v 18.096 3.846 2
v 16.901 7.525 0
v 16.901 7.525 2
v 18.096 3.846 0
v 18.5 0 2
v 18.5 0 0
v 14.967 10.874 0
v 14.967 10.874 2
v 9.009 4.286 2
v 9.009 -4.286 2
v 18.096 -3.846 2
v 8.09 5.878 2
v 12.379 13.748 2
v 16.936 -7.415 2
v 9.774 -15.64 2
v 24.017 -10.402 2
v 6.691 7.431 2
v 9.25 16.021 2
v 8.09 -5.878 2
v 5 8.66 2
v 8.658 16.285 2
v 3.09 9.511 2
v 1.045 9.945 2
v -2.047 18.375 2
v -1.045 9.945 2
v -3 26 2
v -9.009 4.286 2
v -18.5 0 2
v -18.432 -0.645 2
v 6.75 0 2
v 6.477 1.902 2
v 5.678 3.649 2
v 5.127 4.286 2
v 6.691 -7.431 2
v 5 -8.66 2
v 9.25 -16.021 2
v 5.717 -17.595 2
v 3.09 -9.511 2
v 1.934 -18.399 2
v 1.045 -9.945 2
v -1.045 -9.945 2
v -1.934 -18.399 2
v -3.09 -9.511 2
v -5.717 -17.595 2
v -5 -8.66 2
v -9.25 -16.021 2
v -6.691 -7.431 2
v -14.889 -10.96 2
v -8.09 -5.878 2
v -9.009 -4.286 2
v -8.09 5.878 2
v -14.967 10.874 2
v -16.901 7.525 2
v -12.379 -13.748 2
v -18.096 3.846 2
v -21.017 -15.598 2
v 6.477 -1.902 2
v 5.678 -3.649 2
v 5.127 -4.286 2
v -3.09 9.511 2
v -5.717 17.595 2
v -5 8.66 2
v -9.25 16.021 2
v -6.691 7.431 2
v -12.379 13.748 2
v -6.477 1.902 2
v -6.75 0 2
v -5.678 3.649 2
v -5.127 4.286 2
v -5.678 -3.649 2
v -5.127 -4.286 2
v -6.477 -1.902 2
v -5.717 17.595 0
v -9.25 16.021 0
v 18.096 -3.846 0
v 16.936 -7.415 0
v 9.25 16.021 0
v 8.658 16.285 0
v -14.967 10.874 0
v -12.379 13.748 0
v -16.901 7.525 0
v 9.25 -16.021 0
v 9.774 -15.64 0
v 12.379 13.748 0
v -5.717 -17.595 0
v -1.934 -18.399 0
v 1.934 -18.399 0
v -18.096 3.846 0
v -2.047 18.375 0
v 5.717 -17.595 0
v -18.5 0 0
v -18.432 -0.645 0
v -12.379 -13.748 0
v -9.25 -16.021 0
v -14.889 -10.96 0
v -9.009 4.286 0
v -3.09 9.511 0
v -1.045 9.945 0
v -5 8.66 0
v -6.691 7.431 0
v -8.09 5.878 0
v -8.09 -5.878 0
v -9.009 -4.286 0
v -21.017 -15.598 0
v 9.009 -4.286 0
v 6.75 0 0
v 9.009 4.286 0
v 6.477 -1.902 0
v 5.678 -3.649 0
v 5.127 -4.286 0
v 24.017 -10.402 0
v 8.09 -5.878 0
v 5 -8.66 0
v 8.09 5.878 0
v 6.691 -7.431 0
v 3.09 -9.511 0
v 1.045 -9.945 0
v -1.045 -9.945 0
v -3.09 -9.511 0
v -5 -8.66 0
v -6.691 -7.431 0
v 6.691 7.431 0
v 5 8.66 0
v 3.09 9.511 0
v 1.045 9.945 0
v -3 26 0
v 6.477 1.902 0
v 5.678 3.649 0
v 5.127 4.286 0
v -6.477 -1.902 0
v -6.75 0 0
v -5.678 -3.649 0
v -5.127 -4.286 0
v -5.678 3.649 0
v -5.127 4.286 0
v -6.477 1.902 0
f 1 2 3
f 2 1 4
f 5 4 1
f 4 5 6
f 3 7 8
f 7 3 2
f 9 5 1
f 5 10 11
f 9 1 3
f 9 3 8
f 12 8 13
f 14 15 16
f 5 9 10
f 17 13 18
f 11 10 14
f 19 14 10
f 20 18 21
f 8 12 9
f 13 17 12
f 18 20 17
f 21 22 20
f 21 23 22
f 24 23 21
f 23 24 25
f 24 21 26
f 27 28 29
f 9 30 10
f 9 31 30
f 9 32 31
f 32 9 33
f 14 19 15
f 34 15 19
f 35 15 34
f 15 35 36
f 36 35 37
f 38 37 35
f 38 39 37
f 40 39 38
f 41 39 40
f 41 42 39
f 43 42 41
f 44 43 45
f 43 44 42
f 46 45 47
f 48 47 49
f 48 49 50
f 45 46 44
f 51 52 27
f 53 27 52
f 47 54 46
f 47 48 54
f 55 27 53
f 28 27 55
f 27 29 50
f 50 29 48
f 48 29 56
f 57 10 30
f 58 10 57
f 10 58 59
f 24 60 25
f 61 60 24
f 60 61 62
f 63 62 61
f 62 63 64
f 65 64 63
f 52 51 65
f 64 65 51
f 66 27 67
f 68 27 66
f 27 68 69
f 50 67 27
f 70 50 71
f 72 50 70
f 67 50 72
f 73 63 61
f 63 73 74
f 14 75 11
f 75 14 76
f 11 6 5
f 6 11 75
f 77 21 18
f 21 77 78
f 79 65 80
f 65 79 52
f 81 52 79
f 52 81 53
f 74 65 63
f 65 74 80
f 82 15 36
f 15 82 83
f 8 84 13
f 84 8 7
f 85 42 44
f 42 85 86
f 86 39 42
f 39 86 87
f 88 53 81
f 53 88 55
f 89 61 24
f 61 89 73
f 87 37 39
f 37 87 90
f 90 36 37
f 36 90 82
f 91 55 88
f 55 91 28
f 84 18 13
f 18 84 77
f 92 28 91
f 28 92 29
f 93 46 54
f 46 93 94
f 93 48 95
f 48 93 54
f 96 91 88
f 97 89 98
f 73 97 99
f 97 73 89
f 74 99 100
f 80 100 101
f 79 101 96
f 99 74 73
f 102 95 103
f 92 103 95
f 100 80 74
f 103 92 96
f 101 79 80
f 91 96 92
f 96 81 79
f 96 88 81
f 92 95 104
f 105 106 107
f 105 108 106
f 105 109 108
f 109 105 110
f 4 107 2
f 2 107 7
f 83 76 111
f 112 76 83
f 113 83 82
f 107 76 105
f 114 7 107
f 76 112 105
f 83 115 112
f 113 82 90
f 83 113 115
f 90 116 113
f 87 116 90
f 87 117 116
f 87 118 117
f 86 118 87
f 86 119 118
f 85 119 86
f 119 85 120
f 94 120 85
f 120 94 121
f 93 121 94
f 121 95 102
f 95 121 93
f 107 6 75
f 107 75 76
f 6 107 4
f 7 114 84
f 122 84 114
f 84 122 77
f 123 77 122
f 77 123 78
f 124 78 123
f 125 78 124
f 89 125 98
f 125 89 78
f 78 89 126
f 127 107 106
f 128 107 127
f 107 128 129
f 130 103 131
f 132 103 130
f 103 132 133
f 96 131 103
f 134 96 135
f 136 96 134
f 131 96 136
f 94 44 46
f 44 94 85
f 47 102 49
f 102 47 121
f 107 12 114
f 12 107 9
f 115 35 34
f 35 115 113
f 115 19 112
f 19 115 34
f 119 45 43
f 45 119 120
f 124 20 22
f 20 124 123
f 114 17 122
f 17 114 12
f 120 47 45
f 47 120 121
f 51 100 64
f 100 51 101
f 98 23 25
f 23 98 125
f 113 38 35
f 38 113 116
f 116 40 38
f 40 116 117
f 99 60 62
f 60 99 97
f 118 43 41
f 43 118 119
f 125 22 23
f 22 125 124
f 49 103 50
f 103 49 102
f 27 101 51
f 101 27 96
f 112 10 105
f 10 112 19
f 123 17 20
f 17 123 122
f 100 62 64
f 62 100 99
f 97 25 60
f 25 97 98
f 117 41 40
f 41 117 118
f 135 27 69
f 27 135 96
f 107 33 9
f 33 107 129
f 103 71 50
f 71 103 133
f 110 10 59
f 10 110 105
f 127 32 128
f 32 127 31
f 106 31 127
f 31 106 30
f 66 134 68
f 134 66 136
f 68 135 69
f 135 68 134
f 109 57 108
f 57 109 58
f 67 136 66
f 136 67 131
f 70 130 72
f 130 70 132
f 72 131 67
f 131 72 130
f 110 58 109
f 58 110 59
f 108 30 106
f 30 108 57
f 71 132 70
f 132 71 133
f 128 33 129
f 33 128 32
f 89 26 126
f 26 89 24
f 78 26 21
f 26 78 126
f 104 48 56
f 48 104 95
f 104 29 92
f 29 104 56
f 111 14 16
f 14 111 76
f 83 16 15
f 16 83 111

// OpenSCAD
// file: attack-ring-base.scad
thickness = 2;
base_diameter = 35;
core_diameter = 15;

module attack_ring_base() {
    clip_length = base_diameter;
    clip_width = core_diameter / 1.75;

    difference() {
        cylinder(thickness, d = base_diameter + thickness);
        cylinder(thickness, d = core_diameter + 5);
    }
    difference() {
        translate([-clip_length / 2, -clip_width / 2])
        cube([clip_length, clip_width, thickness]);
        cylinder(thickness, d = core_diameter - thickness + 0.5);
    }
}

attack_ring_base();
// file: lib/openscad-lib/prism.scad
module prism(points, height) {
    top_points = [ for (p = points) [p[0], p[1], height] ];
    
    points = concat(points, top_points);
    vertices = len(points);
    sides_count = vertices / 2;
    faces = concat(
        [[ for (i = [0:sides_count - 1]) i ]],
        [ for (i = [0:sides_count - 1]) 
            [
                (i + sides_count) % vertices,
                i == sides_count - 1 ? i + 1 : (i + sides_count + 1) % vertices,
                i != sides_count - 1 ? i + 1 : (i + sides_count + 1) % vertices,
                i,
            ]
        ],
        [[ for (i = [vertices - 1:-1:sides_count]) i ]]
    );

    polyhedron(points, faces);
}

module regular_prism(
    sides_count,
    radius = 0,
    sides_length,
    height,
) {
    radius = radius != 0 ? radius : (sides_length / (2 * sin(180 / sides_count)));
    angles = [ for (i = [0:sides_count - 1]) i * (360 / sides_count) ];
    
    base_points = [ for (i = angles) [radius * cos(i), radius * sin(i), 0] ];

    prism(points = base_points, height = height);
}
// main file
use <lib/openscad-lib/prism.scad>
use <attack-ring-base.scad>

attack_ring_base();
for (i = [0:2]) {
    rotate(i * 120)
    translate([0, 18])
    prism(
        [
            [-2, 0],
            [-3, 8],
            [9, -2]
        ],
        2
    );
}
